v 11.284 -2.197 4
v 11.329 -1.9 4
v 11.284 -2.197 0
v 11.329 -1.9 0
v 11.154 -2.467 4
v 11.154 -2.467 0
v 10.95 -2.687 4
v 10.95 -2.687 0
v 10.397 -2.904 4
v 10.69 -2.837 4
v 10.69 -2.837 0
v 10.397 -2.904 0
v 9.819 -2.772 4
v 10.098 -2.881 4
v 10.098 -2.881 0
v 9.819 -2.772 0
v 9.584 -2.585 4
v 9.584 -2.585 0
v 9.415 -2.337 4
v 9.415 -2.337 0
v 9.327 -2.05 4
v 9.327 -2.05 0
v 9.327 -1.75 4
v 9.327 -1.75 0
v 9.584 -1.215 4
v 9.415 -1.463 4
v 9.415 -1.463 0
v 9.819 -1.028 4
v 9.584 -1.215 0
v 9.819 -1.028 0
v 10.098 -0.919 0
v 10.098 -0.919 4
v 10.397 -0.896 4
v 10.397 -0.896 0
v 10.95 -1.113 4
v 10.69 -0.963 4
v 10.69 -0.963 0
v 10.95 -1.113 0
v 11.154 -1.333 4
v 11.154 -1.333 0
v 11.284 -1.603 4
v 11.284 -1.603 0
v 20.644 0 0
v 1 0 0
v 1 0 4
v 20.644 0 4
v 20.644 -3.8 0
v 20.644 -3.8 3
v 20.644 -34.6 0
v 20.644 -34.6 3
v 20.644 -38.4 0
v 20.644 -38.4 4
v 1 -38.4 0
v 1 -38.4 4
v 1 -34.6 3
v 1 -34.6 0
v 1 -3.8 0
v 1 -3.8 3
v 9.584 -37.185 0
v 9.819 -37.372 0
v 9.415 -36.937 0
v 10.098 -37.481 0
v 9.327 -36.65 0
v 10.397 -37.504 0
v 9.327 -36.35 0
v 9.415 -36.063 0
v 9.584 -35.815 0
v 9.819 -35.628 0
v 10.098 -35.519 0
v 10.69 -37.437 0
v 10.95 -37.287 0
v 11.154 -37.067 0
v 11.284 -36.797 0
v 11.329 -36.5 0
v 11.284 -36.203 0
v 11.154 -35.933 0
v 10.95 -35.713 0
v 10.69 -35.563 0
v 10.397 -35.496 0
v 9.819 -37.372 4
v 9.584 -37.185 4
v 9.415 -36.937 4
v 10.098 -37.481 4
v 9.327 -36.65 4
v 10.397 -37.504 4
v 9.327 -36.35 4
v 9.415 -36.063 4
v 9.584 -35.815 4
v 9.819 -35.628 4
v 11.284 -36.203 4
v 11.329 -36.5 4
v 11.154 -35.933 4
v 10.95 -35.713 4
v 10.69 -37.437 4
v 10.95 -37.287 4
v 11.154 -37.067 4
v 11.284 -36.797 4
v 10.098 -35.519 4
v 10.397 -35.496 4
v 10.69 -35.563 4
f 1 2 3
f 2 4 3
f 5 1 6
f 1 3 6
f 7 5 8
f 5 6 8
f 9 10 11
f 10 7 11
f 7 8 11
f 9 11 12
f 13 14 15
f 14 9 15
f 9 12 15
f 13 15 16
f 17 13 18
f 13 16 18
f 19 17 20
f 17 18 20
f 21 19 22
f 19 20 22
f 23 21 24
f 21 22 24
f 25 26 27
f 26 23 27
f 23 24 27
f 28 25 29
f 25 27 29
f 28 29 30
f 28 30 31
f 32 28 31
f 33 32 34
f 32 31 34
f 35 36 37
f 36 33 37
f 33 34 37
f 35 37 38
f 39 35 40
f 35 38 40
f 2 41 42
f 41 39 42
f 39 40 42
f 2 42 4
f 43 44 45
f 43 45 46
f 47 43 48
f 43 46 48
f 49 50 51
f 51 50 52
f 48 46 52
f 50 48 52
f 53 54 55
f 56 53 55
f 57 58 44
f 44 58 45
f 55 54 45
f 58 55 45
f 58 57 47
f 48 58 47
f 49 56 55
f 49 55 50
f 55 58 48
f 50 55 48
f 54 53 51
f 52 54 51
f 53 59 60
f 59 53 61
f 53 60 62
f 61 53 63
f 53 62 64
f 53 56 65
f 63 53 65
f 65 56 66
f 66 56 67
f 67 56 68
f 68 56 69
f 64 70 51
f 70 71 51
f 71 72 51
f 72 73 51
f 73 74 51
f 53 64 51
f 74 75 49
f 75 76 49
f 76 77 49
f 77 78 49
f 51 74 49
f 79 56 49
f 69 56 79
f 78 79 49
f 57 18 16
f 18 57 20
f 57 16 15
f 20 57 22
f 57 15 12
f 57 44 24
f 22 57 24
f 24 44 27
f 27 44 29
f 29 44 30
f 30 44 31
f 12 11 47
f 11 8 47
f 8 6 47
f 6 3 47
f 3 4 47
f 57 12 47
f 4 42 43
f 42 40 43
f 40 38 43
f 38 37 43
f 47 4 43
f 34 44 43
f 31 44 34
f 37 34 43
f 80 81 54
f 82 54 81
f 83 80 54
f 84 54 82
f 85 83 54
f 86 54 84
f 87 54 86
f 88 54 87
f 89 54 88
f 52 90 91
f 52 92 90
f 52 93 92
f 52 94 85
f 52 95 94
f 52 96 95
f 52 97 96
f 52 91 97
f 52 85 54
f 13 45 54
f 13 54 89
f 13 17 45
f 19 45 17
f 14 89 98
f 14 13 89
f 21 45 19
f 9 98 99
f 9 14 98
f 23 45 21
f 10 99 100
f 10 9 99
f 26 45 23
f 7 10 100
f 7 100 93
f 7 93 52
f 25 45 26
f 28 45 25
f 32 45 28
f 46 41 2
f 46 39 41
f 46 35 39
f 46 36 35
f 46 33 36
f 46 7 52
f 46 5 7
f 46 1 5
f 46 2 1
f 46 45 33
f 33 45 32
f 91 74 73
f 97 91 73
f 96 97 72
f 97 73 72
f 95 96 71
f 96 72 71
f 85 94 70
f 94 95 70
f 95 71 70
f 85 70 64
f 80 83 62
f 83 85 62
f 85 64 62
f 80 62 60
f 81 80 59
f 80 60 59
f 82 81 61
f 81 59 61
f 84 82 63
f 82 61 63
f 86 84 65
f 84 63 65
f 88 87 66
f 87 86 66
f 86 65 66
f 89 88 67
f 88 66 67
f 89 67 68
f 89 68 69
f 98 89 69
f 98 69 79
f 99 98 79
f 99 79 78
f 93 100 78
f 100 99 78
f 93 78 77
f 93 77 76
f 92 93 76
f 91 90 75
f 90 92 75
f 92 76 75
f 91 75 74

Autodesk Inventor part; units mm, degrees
ref_plane "YZ Plane" through (0, 0, 0) normal (1, 0, 0) x (0, 1, 0)
ref_plane "XZ Plane" through (0, 0, 0) normal (0, 1, 0) x (-1, 0, 0)
ref_plane "XY Plane" through (0, 0, 0) normal (0, 0, 1) x (1, 0, 0)
sketch "Sketch1" plane through (0, 0, 0) normal (0, 0, 1) x (1, 0, 0)
  line L0 (1, -38.4) -> (1, -34.6) projected
  line L1 (1, -38.4) -> (20.6442, -38.4) projected
  line L2 (20.6442, -38.4) -> (20.6442, -34.6) projected
  line L3 (1, -34.6) -> (20.6442, -34.6) projected
  circle A0 centre (10.3221, -36.5) radius 1.0065 projected
  line L4 (1, 0) -> (1, -3.8) projected
  line L5 (1, -3.8) -> (20.6442, -3.8) projected
  line L6 (20.6442, 0) -> (20.6442, -3.8) projected
  line L7 (1, 0) -> (20.6442, 0) projected
  circle A1 centre (10.3221, -1.9) radius 1.0065 projected
  point P0 (0, 0)
extrude "Extrusion1" add sketch "Sketch1" along normal blind 4
sketch "Sketch2" plane through (0, 0, 4) normal (0, 0, 1) x (1, 0, 0)
  line L0 (20.6442, -34.6) -> (1, -34.6) projected
  line L1 (1, -34.6) -> (1, -38.4) projected
  line L2 (1, -38.4) -> (20.6442, -38.4) projected
  line L3 (20.6442, -38.4) -> (20.6442, -34.6) projected
  circle A0 centre (10.3221, -36.5) radius 1.0065 projected
  line L4 (1, 0) -> (1, -3.8) projected
  line L5 (1, -3.8) -> (20.6442, -3.8) projected
  line L6 (20.6442, -3.8) -> (20.6442, 0) projected
  line L7 (20.6442, 0) -> (1, 0) projected
  circle A1 centre (10.3221, -1.9) radius 1.0065 projected
  line L8 (1, -34.6) -> (1, -3.8)
  line L9 (20.6442, -3.8) -> (20.6442, -34.6)
  point P0 (0, 0)
extrude "Extrusion2" add sketch "Sketch2" against normal blind 1 contours L0 L8 L5 L9
sketch "Sketch3" plane through (1, 0, 0) normal (0, 1, 0) x (1, 0, 0)
  point P0 (-1, 0)
properties part number "PCBDownlHold"
